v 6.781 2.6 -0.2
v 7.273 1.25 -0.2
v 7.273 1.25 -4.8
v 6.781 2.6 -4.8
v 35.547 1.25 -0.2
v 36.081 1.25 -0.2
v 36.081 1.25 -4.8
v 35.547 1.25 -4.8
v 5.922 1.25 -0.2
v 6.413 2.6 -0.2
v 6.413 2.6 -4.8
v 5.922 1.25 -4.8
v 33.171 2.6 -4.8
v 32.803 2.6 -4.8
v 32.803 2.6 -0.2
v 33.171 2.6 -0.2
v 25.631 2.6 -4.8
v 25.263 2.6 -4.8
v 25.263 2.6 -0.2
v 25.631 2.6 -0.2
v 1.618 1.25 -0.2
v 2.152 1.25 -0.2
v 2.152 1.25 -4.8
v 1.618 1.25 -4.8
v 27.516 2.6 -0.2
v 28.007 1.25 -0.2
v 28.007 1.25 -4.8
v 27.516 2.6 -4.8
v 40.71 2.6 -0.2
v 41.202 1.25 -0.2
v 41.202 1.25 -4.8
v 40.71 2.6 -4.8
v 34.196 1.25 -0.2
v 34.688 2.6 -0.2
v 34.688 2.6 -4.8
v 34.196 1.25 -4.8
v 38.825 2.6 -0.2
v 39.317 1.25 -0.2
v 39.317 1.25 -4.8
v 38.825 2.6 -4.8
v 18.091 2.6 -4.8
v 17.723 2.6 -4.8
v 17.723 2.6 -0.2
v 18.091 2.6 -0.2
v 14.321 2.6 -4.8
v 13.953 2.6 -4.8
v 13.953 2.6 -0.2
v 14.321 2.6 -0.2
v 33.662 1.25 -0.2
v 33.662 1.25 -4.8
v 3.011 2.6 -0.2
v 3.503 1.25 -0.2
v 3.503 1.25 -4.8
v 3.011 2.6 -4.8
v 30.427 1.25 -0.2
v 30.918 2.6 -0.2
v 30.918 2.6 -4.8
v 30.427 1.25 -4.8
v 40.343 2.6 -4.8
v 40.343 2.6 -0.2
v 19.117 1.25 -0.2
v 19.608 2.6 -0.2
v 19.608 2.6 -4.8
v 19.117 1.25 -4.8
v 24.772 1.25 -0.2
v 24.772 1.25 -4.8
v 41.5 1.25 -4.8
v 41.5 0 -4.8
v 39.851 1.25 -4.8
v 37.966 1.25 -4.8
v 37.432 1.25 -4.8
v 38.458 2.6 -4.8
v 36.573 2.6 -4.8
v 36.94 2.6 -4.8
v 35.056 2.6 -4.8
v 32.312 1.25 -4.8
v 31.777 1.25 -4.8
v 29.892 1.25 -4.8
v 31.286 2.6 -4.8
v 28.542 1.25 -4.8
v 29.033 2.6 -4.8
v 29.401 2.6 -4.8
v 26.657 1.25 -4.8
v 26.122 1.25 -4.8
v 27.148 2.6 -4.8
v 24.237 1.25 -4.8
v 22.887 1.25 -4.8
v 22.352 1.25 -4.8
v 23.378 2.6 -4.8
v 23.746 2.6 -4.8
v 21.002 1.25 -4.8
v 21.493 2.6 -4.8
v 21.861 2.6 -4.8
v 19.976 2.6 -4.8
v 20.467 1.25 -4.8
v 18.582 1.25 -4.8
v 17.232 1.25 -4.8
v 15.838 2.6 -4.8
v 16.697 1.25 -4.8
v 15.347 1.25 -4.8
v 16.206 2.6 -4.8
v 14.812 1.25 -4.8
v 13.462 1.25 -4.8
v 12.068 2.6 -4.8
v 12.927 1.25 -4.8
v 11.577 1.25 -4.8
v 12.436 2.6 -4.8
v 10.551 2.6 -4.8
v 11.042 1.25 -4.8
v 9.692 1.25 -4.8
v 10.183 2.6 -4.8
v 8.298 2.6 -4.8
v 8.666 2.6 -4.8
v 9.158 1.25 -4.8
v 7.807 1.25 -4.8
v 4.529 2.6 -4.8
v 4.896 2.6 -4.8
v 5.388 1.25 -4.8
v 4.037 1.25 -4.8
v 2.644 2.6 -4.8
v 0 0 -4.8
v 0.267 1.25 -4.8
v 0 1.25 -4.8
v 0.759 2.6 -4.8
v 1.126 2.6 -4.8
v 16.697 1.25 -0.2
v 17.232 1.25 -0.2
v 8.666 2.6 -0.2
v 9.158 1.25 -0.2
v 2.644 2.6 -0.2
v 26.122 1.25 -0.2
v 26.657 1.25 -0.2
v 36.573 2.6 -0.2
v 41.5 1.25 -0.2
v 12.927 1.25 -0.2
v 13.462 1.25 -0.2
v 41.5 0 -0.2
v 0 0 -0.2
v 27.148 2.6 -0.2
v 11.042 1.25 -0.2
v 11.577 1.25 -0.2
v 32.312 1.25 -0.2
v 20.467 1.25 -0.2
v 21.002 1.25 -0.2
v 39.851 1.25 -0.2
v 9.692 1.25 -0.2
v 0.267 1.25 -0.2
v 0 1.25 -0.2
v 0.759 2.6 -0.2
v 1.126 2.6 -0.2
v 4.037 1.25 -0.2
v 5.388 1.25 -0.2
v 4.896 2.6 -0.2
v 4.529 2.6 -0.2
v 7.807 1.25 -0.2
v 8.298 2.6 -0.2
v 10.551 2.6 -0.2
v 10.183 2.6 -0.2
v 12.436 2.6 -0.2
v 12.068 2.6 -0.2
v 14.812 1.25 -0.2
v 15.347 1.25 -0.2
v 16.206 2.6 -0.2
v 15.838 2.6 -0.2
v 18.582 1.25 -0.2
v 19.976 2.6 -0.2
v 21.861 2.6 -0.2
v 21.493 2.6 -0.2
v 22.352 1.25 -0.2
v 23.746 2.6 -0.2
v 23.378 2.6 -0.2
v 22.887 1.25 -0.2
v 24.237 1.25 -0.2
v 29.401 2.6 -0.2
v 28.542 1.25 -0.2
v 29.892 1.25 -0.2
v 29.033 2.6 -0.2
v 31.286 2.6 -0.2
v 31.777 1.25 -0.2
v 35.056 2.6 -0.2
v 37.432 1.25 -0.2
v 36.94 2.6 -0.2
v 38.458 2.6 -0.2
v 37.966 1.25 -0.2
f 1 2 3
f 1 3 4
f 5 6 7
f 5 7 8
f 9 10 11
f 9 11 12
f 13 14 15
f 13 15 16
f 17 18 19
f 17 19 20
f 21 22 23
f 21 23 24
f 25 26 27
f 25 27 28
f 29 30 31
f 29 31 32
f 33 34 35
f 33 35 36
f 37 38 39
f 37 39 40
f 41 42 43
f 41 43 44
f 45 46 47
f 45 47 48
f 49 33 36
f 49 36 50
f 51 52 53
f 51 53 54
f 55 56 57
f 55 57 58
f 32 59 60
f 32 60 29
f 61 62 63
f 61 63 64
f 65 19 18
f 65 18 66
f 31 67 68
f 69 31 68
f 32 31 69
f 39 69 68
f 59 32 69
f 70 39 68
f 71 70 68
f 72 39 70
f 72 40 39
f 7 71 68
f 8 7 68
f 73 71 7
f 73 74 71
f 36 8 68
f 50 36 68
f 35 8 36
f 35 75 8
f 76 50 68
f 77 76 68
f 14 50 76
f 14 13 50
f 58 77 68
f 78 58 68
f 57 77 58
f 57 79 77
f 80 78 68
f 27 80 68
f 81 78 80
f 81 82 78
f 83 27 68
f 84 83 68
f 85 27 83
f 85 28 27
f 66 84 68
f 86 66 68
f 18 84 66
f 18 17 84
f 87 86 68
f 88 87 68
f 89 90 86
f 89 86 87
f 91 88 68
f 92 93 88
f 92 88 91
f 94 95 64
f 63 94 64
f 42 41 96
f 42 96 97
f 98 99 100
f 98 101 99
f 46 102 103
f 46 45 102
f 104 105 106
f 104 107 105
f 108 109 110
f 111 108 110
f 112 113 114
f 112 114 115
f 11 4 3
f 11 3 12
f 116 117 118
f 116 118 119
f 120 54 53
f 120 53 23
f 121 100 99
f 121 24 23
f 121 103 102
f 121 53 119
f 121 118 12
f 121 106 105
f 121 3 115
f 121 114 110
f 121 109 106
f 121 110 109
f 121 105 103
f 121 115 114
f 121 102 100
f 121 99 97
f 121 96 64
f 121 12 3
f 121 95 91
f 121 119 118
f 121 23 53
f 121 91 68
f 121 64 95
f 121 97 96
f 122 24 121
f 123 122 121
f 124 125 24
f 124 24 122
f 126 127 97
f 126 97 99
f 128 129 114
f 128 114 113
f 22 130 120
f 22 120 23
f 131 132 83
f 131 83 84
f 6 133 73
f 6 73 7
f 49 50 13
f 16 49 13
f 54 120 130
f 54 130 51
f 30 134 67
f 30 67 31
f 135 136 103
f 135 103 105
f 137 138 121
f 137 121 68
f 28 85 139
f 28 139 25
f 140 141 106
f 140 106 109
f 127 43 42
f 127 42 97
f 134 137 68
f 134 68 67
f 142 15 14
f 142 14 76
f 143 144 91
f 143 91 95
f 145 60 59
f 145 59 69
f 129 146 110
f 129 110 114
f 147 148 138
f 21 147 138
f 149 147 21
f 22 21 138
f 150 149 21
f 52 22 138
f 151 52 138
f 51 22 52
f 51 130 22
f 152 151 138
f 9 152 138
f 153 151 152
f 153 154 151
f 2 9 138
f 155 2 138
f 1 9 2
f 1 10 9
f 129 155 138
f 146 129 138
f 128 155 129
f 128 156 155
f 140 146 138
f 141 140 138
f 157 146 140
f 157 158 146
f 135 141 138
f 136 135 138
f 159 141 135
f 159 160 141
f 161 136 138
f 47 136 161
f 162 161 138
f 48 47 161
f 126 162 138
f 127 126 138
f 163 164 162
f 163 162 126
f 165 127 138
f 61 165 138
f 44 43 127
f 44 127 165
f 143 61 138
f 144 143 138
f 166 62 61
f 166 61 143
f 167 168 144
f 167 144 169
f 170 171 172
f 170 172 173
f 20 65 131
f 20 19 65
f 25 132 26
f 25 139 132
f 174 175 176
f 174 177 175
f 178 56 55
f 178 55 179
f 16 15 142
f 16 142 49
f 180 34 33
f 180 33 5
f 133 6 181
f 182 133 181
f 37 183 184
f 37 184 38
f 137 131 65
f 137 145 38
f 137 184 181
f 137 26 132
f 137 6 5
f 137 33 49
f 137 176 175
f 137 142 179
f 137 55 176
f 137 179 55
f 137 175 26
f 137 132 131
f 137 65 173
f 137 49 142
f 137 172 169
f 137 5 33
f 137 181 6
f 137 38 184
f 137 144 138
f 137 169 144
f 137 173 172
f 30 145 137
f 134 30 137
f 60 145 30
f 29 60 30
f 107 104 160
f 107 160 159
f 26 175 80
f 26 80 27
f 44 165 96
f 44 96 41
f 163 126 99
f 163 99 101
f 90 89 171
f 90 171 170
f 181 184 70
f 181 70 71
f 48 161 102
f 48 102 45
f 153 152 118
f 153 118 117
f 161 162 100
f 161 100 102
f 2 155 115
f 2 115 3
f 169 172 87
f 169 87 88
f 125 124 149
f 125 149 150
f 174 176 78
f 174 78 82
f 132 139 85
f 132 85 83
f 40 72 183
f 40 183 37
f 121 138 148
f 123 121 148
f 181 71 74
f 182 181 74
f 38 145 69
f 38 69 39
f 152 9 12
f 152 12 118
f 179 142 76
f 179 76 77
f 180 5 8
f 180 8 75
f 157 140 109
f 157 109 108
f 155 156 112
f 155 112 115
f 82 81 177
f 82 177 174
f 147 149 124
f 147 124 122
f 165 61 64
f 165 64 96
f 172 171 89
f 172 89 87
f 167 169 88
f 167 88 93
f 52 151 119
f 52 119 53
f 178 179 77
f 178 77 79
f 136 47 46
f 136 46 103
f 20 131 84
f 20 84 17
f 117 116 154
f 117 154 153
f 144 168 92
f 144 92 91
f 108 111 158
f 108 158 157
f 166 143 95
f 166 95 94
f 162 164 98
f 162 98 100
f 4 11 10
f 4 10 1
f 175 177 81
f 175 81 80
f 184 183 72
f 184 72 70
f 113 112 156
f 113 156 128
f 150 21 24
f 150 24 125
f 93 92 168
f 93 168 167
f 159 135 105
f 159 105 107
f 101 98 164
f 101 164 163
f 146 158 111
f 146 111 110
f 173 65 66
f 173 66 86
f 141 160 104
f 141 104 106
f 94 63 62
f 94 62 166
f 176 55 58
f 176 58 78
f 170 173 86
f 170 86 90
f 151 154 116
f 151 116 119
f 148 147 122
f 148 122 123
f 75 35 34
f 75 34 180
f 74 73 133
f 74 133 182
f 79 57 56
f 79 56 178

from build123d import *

# Parameters (mm, degrees)
BLANKSKE_W         = 41.5
BLANKSKE_H         = 2.6
BLANK_DEPTH        = 5
TOOTHCUTSIM_DEPTH  = 42.880902569
TEETHCUTS_COUNT    = 23
TEETHCUTS_PITCH    = 1.88495559
CUT_EXTRUDE1_DEPTH = 0.2
CUT_EXTRUDE2_DEPTH = 0.2


with BuildPart() as part:
    # BlankSke → Blank (new body)
    with BuildSketch(Plane.XY):
        with Locations((20.75, 1.3)):
            Rectangle(BLANKSKE_W, BLANKSKE_H)
    extrude(amount=-BLANK_DEPTH)

    # TooCutSkeSim → ToothCutSim (cut, through all)
    with BuildSketch(Plane.XY):
        Polygon((0.267261222, 1.25), (-0.267261222, 1.25), (-0.767865882, 2.6254), (0.767865882, 2.6254), align=None)
    toothcutsim = extrude(amount=-TOOTHCUTSIM_DEPTH, mode=Mode.SUBTRACT)

    # TeethCuts: ToothCutSim ×23
    with Locations(*[(i * TEETHCUTS_PITCH, 0, 0) for i in range(1, TEETHCUTS_COUNT)]):
        add(toothcutsim, mode=Mode.SUBTRACT)

    # Sketch1 → Cut-Extrude1 (cut)
    with BuildSketch(Plane.XY):
        Polygon((41.5, 1.25), (41.201761758, 1.25), (40.710401942, 2.6), (40.342688428, 2.6), (39.851328612, 1.25), (39.316806168, 1.25), (38.825446352, 2.6), (38.457732838, 2.6), (37.966373022, 1.25), (37.431850578, 1.25), (36.940490762, 2.6), (36.572777248, 2.6), (36.081417432, 1.25), (35.546894988, 1.25), (35.055535172, 2.6), (34.687821658, 2.6), (34.196461842, 1.25), (33.661939398, 1.25), (33.170579582, 2.6), (32.802866068, 2.6), (32.311506252, 1.25), (31.776983808, 1.25), (31.285623992, 2.6), (30.917910478, 2.6), (30.426550662, 1.25), (29.892028218, 1.25), (29.400668402, 2.6), (29.032954888, 2.6), (28.541595072, 1.25), (28.007072628, 1.25), (27.515712812, 2.6), (27.147999298, 2.6), (26.656639482, 1.25), (26.122117038, 1.25), (25.630757222, 2.6), (25.263043708, 2.6), (24.771683892, 1.25), (24.237161448, 1.25), (23.745801632, 2.6), (23.378088118, 2.6), (22.886728302, 1.25), (22.352205858, 1.25), (21.860846042, 2.6), (21.493132528, 2.6), (21.001772712, 1.25), (20.467250268, 1.25), (19.975890452, 2.6), (19.608176938, 2.6), (19.116817122, 1.25), (18.582294678, 1.25), (18.090934862, 2.6), (17.723221348, 2.6), (17.231861532, 1.25), (16.697339088, 1.25), (16.205979272, 2.6), (15.838265758, 2.6), (15.346905942, 1.25), (14.812383498, 1.25), (14.321023682, 2.6), (13.953310168, 2.6), (13.461950352, 1.25), (12.927427908, 1.25), (12.436068092, 2.6), (12.068354578, 2.6), (11.576994762, 1.25), (11.042472318, 1.25), (10.551112502, 2.6), (10.183398988, 2.6), (9.692039172, 1.25), (9.157516728, 1.25), (8.666156912, 2.6), (8.298443398, 2.6), (7.807083582, 1.25), (7.272561138, 1.25), (6.781201322, 2.6), (6.413487808, 2.6), (5.922127992, 1.25), (5.387605548, 1.25), (4.896245732, 2.6), (4.528532218, 2.6), (4.037172402, 1.25), (3.502649958, 1.25), (3.011290142, 2.6), (2.643576628, 2.6), (2.152216812, 1.25), (1.617694368, 1.25), (1.126334552, 2.6), (0.758621038, 2.6), (0.267261222, 1.25), (0, 1.25), (0, 0), (41.5, 0), align=None)
    extrude(amount=-CUT_EXTRUDE1_DEPTH, mode=Mode.SUBTRACT)

    # Sketch2 → Cut-Extrude2 (cut)
    with BuildSketch(Plane(origin=(0, 0, -5), x_dir=(-1, 0, 0), z_dir=(0, 0, -1))):
        Polygon((-40.710401942, 2.6), (-41.201761758, 1.25), (-41.5, 1.25), (-41.5, 0), (0, 0), (0, 1.25), (-0.267261222, 1.25), (-0.758621038, 2.6), (-1.126334552, 2.6), (-1.617694368, 1.25), (-2.152216812, 1.25), (-2.643576628, 2.6), (-3.011290142, 2.6), (-3.502649958, 1.25), (-4.037172402, 1.25), (-4.528532218, 2.6), (-4.896245732, 2.6), (-5.387605548, 1.25), (-5.922127992, 1.25), (-6.413487808, 2.6), (-6.781201322, 2.6), (-7.272561138, 1.25), (-7.807083582, 1.25), (-8.298443398, 2.6), (-8.666156912, 2.6), (-9.157516728, 1.25), (-9.692039172, 1.25), (-10.183398988, 2.6), (-10.551112502, 2.6), (-11.042472318, 1.25), (-11.576994762, 1.25), (-12.068354578, 2.6), (-12.436068092, 2.6), (-12.927427908, 1.25), (-13.461950352, 1.25), (-13.953310168, 2.6), (-14.321023682, 2.6), (-14.812383498, 1.25), (-15.346905942, 1.25), (-15.838265758, 2.6), (-16.205979272, 2.6), (-16.697339088, 1.25), (-17.231861532, 1.25), (-17.723221348, 2.6), (-18.090934862, 2.6), (-18.582294678, 1.25), (-19.116817122, 1.25), (-19.608176938, 2.6), (-19.975890452, 2.6), (-20.467250268, 1.25), (-21.001772712, 1.25), (-21.493132528, 2.6), (-21.860846042, 2.6), (-22.352205858, 1.25), (-22.886728302, 1.25), (-23.378088118, 2.6), (-23.745801632, 2.6), (-24.237161448, 1.25), (-24.771683892, 1.25), (-25.263043708, 2.6), (-25.630757222, 2.6), (-26.122117038, 1.25), (-26.656639482, 1.25), (-27.147999298, 2.6), (-27.515712812, 2.6), (-28.007072628, 1.25), (-28.541595072, 1.25), (-29.032954888, 2.6), (-29.400668402, 2.6), (-29.892028218, 1.25), (-30.426550662, 1.25), (-30.917910478, 2.6), (-31.285623992, 2.6), (-31.776983808, 1.25), (-32.311506252, 1.25), (-32.802866068, 2.6), (-33.170579582, 2.6), (-33.661939398, 1.25), (-34.196461842, 1.25), (-34.687821658, 2.6), (-35.055535172, 2.6), (-35.546894988, 1.25), (-36.081417432, 1.25), (-36.572777248, 2.6), (-36.940490762, 2.6), (-37.431850578, 1.25), (-37.966373022, 1.25), (-38.457732838, 2.6), (-38.825446352, 2.6), (-39.316806168, 1.25), (-39.851328612, 1.25), (-40.342688428, 2.6), align=None)
    extrude(amount=-CUT_EXTRUDE2_DEPTH, mode=Mode.SUBTRACT)


solid = part.part
